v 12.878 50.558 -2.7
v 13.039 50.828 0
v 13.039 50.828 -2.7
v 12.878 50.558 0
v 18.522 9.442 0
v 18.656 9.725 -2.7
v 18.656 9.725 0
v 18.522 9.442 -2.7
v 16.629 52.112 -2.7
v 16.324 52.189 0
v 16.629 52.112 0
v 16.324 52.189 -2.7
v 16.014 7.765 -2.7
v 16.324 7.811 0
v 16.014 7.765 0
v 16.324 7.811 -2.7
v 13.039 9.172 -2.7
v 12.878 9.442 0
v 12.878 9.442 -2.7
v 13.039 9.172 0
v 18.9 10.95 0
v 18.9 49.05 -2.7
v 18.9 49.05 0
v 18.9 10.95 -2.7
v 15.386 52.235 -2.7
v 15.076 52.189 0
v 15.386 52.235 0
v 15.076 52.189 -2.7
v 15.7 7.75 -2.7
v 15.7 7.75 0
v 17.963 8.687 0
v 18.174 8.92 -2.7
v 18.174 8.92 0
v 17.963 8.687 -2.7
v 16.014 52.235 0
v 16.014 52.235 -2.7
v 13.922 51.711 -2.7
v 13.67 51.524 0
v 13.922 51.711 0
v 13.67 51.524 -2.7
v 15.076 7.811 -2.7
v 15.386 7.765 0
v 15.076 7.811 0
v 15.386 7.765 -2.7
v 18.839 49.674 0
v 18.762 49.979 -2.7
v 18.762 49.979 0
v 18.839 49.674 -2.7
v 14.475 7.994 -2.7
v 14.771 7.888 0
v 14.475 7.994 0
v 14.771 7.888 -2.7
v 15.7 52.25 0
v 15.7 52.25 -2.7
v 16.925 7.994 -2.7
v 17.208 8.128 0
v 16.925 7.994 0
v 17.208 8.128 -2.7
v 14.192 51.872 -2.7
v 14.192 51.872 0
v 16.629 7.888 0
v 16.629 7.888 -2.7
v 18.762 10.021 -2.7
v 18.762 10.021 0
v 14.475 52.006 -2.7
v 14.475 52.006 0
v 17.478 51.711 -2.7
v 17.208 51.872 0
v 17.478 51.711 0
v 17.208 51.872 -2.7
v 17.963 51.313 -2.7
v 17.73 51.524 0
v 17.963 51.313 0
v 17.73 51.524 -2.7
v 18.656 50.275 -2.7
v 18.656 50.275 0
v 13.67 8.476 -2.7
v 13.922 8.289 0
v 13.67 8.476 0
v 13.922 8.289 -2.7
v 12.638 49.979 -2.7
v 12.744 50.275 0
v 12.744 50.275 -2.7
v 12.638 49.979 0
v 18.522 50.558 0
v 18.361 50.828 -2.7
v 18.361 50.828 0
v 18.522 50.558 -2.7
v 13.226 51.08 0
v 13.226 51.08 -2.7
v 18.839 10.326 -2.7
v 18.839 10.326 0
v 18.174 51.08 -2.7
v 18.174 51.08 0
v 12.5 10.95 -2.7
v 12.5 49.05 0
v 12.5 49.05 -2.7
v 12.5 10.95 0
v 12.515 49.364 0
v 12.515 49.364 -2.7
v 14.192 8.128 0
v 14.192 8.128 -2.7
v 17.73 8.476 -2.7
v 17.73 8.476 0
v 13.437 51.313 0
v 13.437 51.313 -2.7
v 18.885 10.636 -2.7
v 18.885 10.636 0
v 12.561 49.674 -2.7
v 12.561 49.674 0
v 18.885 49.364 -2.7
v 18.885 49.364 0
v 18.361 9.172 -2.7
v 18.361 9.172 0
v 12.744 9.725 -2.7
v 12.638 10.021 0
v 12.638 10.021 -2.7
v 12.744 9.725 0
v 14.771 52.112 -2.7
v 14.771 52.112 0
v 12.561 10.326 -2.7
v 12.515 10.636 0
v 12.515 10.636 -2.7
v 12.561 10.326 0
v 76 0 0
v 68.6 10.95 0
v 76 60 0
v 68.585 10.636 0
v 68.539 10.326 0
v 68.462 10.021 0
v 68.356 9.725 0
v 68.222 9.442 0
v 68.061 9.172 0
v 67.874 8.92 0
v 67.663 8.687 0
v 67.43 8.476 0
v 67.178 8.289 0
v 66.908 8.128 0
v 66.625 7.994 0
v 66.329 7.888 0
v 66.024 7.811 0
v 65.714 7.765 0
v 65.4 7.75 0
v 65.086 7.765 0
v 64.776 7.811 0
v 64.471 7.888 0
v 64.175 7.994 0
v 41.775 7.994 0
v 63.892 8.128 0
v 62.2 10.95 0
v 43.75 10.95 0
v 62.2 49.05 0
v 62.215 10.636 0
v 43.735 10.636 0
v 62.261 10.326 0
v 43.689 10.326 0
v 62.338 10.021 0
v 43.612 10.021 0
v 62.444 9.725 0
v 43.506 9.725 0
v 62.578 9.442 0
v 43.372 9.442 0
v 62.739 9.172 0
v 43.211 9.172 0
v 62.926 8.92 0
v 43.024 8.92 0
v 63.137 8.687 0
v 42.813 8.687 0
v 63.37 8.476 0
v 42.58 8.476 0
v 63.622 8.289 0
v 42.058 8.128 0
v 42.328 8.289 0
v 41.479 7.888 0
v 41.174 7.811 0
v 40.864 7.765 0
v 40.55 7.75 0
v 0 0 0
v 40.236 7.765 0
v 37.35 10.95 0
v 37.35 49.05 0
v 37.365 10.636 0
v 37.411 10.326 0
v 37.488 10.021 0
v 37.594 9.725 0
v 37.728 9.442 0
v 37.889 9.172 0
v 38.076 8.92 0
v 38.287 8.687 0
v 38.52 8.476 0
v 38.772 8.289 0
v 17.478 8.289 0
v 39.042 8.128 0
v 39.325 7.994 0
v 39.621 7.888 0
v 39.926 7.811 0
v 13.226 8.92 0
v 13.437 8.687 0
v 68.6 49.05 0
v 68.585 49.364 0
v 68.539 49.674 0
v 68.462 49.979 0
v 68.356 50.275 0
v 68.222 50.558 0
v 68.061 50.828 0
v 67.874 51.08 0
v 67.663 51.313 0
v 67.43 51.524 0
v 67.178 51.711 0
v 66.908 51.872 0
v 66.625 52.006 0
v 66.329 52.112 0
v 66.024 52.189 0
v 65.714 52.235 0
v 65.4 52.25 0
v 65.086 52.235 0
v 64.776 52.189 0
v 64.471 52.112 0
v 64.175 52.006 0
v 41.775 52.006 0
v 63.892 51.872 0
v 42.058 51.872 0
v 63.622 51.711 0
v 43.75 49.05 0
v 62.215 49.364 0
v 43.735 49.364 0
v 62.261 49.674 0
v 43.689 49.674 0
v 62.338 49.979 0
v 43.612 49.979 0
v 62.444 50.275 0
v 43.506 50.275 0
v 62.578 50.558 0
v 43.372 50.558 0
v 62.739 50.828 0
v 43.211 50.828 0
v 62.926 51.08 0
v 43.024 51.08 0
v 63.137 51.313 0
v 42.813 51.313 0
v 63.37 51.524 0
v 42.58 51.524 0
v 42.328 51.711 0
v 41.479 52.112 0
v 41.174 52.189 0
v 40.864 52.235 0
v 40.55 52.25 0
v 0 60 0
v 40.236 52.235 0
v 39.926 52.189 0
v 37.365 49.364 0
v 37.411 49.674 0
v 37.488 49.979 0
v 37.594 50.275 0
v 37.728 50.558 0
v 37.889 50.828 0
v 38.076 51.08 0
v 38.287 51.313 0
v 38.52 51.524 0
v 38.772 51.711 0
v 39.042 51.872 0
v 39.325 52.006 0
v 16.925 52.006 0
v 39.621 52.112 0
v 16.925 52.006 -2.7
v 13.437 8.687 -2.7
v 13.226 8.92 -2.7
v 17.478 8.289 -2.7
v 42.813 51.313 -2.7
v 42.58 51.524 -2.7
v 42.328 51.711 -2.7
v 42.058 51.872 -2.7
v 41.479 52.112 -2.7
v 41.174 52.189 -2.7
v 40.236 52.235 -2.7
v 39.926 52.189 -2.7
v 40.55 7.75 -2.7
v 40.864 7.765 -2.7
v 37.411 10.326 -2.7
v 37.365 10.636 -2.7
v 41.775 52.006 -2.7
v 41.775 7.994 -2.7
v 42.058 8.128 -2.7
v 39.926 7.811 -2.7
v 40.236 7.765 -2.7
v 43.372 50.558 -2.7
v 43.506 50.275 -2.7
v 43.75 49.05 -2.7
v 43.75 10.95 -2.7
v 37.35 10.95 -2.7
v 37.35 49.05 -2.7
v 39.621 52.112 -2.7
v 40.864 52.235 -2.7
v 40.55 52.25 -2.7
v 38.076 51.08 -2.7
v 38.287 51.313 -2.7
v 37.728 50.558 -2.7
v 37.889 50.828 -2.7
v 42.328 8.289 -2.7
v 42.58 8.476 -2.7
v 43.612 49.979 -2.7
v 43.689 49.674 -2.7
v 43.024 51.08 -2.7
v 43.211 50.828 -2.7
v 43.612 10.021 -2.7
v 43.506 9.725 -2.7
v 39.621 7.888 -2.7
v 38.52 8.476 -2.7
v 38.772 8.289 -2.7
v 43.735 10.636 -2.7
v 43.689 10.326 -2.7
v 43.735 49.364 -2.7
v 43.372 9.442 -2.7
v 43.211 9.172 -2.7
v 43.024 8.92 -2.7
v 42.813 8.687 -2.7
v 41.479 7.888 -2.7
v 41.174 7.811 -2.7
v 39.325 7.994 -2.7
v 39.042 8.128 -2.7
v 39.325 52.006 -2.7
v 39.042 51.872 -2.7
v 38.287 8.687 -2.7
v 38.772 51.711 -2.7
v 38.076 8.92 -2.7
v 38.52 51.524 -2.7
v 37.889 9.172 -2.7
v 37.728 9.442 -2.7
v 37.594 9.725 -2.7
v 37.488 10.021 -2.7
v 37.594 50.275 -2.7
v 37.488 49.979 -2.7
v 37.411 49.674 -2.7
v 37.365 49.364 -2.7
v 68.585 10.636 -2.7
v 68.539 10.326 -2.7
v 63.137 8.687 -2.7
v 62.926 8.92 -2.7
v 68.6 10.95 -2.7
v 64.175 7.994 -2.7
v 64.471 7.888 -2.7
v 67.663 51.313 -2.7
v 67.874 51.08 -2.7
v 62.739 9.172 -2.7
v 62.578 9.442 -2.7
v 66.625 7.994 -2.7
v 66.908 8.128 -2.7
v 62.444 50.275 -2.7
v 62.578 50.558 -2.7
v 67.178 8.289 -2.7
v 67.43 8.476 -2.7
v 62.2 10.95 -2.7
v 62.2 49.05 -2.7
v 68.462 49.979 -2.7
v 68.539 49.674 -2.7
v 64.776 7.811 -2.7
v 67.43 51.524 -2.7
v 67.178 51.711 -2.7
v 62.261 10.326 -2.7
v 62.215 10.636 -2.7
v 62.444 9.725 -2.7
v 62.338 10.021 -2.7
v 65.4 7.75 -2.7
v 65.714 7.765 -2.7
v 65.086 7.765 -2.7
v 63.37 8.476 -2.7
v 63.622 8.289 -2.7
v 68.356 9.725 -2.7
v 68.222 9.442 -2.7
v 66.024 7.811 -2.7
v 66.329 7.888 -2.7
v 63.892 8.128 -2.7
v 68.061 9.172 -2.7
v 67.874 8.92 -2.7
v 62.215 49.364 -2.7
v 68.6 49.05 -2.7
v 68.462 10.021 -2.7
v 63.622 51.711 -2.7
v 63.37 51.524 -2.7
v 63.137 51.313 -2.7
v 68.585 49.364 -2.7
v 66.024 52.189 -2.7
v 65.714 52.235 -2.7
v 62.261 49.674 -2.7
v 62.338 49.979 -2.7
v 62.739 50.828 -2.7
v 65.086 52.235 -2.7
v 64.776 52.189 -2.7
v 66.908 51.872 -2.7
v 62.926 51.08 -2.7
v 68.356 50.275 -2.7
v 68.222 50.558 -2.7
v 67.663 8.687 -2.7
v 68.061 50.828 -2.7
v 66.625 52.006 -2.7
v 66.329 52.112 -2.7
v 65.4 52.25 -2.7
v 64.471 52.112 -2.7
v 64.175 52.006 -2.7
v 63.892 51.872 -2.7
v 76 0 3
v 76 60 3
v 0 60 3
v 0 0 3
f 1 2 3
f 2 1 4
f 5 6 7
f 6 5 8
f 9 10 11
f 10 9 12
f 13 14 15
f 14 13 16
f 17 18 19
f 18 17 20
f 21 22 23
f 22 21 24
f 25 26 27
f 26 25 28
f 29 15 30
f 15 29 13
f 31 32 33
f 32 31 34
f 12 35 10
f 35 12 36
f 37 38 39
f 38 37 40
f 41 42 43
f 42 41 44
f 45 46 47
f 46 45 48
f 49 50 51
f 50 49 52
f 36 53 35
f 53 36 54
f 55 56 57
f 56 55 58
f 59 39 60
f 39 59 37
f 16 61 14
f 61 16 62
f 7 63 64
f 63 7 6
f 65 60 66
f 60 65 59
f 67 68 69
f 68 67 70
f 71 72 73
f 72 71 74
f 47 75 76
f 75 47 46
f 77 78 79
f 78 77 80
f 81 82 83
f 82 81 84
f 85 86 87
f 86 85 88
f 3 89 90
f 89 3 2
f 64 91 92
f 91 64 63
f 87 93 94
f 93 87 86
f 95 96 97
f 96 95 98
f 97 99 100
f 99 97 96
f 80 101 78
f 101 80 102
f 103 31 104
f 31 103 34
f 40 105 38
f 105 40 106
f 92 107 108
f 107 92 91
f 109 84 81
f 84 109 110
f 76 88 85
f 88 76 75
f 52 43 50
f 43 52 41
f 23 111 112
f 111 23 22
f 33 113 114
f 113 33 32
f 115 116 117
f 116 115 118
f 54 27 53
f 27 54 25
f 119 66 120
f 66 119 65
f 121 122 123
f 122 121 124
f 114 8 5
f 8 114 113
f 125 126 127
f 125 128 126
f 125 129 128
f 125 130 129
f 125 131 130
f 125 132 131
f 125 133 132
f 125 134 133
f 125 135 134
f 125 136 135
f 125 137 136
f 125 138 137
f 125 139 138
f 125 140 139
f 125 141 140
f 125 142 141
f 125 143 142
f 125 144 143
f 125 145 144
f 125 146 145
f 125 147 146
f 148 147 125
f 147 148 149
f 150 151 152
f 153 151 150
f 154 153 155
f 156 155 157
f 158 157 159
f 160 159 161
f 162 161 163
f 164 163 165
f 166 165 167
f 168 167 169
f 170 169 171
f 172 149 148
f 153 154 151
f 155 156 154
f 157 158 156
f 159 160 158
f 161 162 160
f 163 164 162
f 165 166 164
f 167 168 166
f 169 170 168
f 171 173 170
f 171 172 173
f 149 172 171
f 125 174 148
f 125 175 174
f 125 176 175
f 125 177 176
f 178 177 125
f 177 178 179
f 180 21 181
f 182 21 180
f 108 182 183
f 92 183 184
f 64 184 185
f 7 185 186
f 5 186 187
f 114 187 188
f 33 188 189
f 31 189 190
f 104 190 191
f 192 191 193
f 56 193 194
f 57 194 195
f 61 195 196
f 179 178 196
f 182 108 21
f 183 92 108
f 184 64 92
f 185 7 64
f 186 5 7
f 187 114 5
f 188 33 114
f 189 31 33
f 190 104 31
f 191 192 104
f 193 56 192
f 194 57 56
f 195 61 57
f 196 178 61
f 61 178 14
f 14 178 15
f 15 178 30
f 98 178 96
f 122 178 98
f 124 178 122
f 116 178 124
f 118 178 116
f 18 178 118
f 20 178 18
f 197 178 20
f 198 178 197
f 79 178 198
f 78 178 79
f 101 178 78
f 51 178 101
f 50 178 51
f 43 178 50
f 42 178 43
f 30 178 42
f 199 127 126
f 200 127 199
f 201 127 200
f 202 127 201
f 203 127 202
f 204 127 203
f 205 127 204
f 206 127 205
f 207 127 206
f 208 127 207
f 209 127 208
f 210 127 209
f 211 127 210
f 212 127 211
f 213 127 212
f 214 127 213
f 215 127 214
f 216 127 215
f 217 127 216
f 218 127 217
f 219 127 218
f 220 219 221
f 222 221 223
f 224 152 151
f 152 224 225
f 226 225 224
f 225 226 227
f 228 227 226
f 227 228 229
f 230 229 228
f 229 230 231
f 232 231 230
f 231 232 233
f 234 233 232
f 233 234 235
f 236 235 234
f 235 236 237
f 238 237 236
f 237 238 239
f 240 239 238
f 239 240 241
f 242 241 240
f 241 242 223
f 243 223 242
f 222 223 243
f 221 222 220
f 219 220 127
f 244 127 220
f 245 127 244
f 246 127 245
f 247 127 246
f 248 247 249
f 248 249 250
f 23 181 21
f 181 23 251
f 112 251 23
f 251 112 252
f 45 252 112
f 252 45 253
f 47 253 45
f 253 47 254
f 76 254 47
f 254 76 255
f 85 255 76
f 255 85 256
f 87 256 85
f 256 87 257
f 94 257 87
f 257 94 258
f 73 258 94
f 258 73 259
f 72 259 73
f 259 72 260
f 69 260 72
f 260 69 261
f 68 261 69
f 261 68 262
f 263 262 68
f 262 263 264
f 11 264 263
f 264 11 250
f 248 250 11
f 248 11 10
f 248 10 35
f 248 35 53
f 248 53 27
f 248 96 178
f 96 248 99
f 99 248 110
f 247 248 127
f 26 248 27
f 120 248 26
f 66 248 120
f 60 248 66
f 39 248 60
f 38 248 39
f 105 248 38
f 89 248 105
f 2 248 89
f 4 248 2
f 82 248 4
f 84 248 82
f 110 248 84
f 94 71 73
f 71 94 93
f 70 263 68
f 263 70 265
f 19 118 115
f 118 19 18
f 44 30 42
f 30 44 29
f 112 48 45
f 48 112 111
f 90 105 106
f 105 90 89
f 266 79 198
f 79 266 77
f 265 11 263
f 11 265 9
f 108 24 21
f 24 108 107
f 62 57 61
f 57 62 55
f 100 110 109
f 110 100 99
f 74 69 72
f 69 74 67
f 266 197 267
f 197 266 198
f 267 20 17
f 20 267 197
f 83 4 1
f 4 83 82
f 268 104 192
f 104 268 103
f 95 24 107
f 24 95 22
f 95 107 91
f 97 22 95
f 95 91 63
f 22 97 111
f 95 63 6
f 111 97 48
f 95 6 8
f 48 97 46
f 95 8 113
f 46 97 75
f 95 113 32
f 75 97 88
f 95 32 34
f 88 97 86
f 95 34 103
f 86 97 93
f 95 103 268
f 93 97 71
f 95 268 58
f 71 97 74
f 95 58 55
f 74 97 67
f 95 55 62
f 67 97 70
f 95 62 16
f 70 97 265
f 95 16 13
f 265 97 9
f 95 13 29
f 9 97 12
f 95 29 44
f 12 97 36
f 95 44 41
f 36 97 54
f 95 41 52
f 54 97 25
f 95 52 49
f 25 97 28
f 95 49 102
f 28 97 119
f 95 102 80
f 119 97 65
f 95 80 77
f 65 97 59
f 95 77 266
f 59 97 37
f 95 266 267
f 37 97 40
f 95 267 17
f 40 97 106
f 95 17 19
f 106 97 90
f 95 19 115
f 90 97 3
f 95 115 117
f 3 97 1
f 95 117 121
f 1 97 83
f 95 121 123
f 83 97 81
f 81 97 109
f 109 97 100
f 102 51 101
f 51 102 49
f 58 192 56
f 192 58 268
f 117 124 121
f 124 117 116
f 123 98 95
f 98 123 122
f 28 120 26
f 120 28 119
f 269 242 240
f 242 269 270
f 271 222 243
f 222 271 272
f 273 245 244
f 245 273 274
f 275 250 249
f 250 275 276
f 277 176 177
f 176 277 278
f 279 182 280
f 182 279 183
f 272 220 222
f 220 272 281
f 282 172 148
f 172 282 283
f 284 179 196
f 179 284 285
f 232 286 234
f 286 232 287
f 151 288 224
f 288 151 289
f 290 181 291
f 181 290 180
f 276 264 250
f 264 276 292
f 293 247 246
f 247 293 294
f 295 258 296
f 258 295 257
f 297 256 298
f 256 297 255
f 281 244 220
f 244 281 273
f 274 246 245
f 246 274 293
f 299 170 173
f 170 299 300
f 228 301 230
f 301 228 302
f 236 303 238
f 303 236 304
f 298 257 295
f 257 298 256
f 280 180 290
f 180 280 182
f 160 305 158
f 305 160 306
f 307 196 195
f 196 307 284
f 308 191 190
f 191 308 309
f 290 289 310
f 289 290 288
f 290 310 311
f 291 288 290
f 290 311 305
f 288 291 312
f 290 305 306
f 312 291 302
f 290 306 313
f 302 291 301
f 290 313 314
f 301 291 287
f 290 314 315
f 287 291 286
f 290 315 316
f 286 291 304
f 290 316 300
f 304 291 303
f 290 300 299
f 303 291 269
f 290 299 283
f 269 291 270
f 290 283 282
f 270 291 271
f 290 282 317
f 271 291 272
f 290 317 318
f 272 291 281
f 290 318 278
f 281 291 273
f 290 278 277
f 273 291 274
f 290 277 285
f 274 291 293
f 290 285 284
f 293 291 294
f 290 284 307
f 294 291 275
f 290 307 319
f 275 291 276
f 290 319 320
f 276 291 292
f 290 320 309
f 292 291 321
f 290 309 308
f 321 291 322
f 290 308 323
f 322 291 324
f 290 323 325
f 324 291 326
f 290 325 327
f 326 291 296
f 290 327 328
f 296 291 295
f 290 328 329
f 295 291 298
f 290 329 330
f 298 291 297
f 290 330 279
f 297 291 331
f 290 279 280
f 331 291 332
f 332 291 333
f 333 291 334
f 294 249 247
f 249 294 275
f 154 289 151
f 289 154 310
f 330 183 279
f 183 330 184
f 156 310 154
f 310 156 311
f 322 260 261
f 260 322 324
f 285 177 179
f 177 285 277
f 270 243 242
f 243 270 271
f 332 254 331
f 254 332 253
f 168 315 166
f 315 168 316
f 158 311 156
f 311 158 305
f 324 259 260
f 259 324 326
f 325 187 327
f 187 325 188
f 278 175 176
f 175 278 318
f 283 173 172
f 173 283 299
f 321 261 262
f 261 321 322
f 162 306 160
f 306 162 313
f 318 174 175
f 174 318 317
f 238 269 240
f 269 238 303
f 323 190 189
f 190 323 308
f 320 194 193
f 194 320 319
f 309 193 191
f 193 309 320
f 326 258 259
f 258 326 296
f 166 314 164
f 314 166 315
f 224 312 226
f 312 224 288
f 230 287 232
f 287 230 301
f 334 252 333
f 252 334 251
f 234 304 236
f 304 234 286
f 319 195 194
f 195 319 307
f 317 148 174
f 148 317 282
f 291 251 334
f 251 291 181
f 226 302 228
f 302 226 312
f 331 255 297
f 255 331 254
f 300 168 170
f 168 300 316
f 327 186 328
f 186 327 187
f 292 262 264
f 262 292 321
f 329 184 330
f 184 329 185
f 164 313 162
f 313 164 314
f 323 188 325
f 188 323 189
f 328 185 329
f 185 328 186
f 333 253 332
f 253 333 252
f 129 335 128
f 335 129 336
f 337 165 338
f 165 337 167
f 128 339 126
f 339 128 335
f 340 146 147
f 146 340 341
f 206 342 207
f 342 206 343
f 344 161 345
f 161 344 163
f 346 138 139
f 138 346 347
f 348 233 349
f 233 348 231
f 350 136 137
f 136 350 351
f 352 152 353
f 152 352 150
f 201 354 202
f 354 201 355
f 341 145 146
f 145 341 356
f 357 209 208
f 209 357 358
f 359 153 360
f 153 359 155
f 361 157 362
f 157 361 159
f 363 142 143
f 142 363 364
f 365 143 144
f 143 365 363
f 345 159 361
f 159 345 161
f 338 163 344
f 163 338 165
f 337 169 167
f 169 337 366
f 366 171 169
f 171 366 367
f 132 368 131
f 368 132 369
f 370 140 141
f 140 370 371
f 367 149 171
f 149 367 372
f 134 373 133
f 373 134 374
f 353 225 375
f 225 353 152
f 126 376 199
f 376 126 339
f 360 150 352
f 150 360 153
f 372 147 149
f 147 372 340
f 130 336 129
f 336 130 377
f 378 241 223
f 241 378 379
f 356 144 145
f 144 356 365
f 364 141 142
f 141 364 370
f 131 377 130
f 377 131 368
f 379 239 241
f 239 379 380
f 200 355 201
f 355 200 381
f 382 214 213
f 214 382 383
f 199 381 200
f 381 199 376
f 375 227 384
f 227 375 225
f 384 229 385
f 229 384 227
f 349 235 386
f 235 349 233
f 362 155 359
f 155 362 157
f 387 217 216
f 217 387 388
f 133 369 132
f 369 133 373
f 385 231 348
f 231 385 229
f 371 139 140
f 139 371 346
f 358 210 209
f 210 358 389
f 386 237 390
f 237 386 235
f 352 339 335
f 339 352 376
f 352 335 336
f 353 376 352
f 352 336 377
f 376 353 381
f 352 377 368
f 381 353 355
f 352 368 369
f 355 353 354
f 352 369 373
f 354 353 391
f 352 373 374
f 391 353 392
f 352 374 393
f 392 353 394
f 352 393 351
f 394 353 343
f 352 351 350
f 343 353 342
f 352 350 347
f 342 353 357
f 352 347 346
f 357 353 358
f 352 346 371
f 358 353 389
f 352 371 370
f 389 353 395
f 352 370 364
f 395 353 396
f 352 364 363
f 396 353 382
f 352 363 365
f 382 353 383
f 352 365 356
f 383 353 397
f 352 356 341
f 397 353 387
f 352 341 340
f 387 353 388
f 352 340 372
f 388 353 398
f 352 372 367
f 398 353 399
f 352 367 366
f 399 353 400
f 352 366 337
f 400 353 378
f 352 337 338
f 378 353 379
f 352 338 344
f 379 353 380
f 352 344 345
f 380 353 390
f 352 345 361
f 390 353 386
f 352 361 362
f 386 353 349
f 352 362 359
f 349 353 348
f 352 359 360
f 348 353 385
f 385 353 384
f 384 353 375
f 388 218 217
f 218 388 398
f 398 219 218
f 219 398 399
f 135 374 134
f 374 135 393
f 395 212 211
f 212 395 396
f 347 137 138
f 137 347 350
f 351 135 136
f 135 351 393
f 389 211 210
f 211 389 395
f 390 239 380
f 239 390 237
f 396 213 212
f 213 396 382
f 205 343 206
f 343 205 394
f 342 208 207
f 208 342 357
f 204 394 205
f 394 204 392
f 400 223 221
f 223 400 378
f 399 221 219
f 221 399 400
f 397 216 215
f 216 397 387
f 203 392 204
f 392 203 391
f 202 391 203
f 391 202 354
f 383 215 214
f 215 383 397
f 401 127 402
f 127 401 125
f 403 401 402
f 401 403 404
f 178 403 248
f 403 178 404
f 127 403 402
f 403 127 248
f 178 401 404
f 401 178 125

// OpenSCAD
// pc-licht-stativ-halter

// 25, 18.25
// check: 18.25 + 6.6 == 24.85

$fn=64;

w=76;
h=3;

h_ribs=2.7;

d_total = 60;
d_ribs = 44.5;

tolerance_ribs = 0.1;
r_ribs = 6.6/2 - tolerance_ribs;

module base(){
    cube([76, 60, h]);
    
    for(x=[12.5:24.85:w]){  // 12.5 zum äußeren Rand gemessen
        hull(){
            translate([x+r_ribs, (d_total-d_ribs)/2 + r_ribs, -h_ribs])
            cylinder(r=r_ribs, h=h_ribs);
            
            translate([x+r_ribs, (d_total-d_ribs)/2 + d_ribs - r_ribs, -h_ribs])
            cylinder(r=r_ribs, h=h_ribs);
        }
    }
}

base();
